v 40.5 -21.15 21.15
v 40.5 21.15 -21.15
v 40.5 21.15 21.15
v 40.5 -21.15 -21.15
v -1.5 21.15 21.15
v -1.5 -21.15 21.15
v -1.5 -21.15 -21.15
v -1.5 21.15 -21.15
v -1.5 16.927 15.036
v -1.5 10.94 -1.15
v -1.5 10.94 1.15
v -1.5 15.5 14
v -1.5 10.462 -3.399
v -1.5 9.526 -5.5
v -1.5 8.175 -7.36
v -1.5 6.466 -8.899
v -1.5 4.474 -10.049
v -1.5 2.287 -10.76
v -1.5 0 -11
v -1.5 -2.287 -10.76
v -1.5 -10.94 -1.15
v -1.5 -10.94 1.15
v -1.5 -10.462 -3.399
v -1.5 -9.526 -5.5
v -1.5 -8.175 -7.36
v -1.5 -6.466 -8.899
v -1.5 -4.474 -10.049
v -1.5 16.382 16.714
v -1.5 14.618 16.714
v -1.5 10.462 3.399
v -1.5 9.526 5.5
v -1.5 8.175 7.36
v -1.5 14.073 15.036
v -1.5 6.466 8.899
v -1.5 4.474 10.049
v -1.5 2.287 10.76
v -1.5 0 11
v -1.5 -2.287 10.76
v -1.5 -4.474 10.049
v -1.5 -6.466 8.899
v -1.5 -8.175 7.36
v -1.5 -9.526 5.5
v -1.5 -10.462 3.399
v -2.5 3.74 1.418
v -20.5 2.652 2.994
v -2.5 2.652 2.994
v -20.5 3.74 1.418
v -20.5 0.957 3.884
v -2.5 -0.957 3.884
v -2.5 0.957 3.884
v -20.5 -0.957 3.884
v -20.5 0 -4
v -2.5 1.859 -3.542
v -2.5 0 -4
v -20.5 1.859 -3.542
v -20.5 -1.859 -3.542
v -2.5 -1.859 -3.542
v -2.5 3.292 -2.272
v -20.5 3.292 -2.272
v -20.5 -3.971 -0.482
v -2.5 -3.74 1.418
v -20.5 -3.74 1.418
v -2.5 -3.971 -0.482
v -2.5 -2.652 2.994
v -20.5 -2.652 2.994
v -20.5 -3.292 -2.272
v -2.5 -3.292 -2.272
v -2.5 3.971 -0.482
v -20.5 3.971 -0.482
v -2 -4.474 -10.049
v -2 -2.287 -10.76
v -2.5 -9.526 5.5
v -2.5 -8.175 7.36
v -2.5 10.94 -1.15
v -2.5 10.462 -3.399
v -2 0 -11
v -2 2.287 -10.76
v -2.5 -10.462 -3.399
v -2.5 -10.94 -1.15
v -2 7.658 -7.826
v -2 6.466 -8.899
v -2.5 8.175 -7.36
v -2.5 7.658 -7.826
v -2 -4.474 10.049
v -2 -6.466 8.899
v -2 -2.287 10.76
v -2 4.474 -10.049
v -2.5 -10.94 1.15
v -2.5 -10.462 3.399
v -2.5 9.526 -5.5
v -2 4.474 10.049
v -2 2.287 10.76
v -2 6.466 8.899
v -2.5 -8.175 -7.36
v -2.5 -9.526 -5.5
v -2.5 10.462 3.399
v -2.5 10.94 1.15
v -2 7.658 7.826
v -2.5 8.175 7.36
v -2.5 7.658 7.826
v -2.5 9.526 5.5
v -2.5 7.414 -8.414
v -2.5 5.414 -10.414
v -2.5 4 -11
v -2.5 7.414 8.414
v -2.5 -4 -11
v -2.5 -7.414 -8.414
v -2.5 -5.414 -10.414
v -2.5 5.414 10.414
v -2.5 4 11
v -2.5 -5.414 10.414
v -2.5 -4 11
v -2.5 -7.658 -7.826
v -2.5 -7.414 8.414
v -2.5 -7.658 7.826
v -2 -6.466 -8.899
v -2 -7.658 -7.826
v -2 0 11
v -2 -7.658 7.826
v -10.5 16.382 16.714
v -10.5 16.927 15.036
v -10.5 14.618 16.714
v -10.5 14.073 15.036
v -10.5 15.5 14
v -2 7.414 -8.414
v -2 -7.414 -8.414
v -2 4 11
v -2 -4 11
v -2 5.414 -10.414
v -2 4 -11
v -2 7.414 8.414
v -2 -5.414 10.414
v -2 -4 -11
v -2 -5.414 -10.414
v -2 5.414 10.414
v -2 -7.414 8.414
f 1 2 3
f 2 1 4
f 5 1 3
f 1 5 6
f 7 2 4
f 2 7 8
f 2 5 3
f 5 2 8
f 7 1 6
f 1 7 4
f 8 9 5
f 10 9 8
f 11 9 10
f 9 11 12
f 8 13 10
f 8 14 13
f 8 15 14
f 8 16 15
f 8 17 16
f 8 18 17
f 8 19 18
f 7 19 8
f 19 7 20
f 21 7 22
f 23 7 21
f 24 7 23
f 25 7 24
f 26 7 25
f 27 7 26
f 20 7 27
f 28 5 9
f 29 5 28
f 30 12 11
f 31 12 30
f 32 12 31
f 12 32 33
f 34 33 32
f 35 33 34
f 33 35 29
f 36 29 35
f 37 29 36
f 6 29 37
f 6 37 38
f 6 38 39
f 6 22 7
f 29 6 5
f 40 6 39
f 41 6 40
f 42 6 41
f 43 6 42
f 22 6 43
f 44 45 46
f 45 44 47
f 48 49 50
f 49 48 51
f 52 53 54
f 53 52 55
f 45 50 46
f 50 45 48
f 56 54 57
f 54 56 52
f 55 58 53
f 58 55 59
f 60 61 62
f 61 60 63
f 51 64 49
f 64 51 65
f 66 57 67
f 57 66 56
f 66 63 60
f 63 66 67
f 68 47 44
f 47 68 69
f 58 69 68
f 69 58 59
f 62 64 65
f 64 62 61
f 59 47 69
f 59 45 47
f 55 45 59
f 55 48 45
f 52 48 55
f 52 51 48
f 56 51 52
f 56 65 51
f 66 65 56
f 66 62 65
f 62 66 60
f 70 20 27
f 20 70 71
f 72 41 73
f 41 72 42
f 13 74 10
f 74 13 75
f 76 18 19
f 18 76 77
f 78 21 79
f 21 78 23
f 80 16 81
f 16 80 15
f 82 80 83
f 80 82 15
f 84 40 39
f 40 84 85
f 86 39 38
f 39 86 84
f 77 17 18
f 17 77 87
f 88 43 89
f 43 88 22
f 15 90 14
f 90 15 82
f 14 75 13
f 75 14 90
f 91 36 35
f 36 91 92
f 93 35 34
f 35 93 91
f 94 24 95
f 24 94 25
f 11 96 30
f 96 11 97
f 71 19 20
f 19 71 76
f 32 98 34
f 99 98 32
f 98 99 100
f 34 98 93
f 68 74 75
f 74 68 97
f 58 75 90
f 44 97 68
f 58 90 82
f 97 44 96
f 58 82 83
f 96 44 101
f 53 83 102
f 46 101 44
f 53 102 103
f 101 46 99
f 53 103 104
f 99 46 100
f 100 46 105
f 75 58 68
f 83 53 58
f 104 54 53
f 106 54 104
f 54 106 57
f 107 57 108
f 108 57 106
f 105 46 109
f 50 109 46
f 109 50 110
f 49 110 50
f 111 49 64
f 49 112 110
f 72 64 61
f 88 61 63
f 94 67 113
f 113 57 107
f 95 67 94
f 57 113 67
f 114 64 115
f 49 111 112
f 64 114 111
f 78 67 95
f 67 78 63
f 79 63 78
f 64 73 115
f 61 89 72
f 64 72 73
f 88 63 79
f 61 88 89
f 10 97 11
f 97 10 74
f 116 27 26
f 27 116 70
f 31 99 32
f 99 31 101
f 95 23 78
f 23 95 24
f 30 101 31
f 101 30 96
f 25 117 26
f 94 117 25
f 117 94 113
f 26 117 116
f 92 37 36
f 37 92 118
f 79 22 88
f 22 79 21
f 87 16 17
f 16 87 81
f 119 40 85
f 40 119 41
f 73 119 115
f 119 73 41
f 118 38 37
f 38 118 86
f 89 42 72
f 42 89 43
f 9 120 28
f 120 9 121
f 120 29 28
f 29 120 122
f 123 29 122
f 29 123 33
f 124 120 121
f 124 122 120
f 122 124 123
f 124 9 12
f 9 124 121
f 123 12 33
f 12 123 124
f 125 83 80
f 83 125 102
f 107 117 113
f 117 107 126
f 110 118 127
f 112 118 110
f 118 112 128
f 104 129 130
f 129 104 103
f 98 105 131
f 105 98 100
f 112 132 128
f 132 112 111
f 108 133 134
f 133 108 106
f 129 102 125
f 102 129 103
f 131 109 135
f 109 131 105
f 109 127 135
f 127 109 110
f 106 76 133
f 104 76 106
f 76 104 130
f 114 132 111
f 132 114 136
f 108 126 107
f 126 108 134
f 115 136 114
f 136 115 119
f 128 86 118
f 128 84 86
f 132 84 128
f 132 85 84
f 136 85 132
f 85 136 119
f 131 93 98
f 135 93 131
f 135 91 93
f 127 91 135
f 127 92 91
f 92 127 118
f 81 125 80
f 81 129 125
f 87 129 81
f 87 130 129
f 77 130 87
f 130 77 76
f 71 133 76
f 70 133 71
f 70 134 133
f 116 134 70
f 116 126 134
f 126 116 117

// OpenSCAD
// Parameters
face_width_mm = 42.3; //[21.15:84.6:0.1]
body_length_mm = 40; //[20:80:0.5]
body_depth_mm = 42.3; //[21.15:84.6:0.1]
body_height_mm = 42.3; //[21.15:84.6:0.1]
front_face_thickness_mm = 3; //[1.5:6:0.1]
shaft_diameter_mm = 8; //[4:16:0.1]
shaft_length_mm = 20; //[10:40:0.5]
mounting_hole_spacing_mm = 31; //[15.5:62:0.1]
mounting_hole_diameter_mm = 3.5; //[2:6:0.1]
mounting_hole_depth_mm = 6; //[3:15:0.5]
corner_radius_mm = 2; //[0:6:0.1]
boss_diameter_mm = 22; //[11:44:0.1]
boss_height_mm = 2; //[0:6:0.1]
overlap_mm = 1; //[0.5:2:0.1]
hole_clearance_extra_mm = 0.2; //[0:0.6:0.05]
d_plug_length_mm = 18; //[9:36:0.5]
d_plug_width_mm = 12; //[6:24:0.5]
d_plug_rad_mm = 2; //[0.5:6:0.1]
grill_hole_diameter_mm = 3; //[1:8:0.1]
grill_gap_mm = 2; //[0.5:6:0.1]
pattern_stub_size_mm = 0.5; //[0.2:2:0.1]
screw_shank_diameter_mm = 3; //[2:6:0.1]
screw_length_mm = 10; //[5:30:0.5]
washer_outer_diameter_mm = 7; //[4:16:0.1]
washer_thickness_mm = 1; //[0.5:3:0.1]

// NEMA-style stepper motor
module NEMA_motor() {
  color("Black") {
    // Motor body
    translate([front_face_thickness_mm/2 + body_length_mm/2 - overlap_mm, 0, 0])
      cube([body_length_mm, body_depth_mm, body_height_mm], center=true);
    // Front face plate
    translate([0, 0, 0])
      cube([front_face_thickness_mm, face_width_mm, face_width_mm], center=true);
    // Shaft
    color("Silver")
    translate([-front_face_thickness_mm/2 - shaft_length_mm/2 + overlap_mm, 0, 0])
      rotate([0, 90, 0])
      cylinder(r=shaft_diameter_mm/2, h=shaft_length_mm, center=true);
    // Optional boss
    translate([-front_face_thickness_mm/2 - boss_height_mm/2 + overlap_mm, 0, 0])
      rotate([0, 90, 0])
      cylinder(r=boss_diameter_mm/2, h=boss_height_mm, center=true);
  }
}

// D Plug D
module d_plug_D() {
  color("DimGray") {
    translate([-front_face_thickness_mm/2 + pattern_stub_size_mm/2 - overlap_mm, 0, 0])
      rotate([0, 90, 0])
      linear_extrude(height=pattern_stub_size_mm, center=true)
      offset(r=d_plug_rad_mm)
      polygon(points=[
        [-d_plug_length_mm/2 + d_plug_rad_mm, -d_plug_width_mm/2],
        [d_plug_length_mm/2 - d_plug_rad_mm, -d_plug_width_mm/2],
        [d_plug_length_mm/2, -d_plug_width_mm/2 + d_plug_rad_mm],
        [d_plug_length_mm/2, d_plug_width_mm/2 - d_plug_rad_mm],
        [d_plug_length_mm/2 - d_plug_rad_mm, d_plug_width_mm/2],
        [-d_plug_length_mm/2 + d_plug_rad_mm, d_plug_width_mm/2],
        [-d_plug_length_mm/2, d_plug_width_mm/2 - d_plug_rad_mm],
        [-d_plug_length_mm/2, -d_plug_width_mm/2 + d_plug_rad_mm]
      ]);
  }
}

// Grill Hole Positions
module grill_hole_positions() {
  color("Silver") {
    translate([front_face_thickness_mm/2 + pattern_stub_size_mm/2 - overlap_mm, 0, 0])
      sphere(r=pattern_stub_size_mm);
  }
}

// Screw and Washer
module screw_and_washer() {
  color("Silver") {
    // Screw shank
    translate([-front_face_thickness_mm/2 - screw_length_mm/2 + overlap_mm, mounting_hole_spacing_mm/2, mounting_hole_spacing_mm/2])
      rotate([0, 90, 0])
      cylinder(r=screw_shank_diameter_mm/2, h=screw_length_mm, center=true);
    // Washer
    translate([-front_face_thickness_mm/2 - washer_thickness_mm/2 + overlap_mm, mounting_hole_spacing_mm/2, mounting_hole_spacing_mm/2])
      rotate([0, 90, 0])
      cylinder(r=washer_outer_diameter_mm/2, h=washer_thickness_mm, center=true);
  }
}

// Ttrack Hole Positions
module ttrack_hole_positions() {
  color("Silver") {
    translate([front_face_thickness_mm/2 + pattern_stub_size_mm/2 - overlap_mm, pattern_stub_size_mm, 0])
      sphere(r=pattern_stub_size_mm);
  }
}

// Rail Hole Positions
module rail_hole_positions() {
  color("Silver") {
    translate([front_face_thickness_mm/2 + pattern_stub_size_mm/2 - overlap_mm, -pattern_stub_size_mm, 0])
      sphere(r=pattern_stub_size_mm);
  }
}

// Assembly
module assembly() {
  NEMA_motor();
  d_plug_D();
  grill_hole_positions();
  screw_and_washer();
  ttrack_hole_positions();
  rail_hole_positions();
}

assembly();
